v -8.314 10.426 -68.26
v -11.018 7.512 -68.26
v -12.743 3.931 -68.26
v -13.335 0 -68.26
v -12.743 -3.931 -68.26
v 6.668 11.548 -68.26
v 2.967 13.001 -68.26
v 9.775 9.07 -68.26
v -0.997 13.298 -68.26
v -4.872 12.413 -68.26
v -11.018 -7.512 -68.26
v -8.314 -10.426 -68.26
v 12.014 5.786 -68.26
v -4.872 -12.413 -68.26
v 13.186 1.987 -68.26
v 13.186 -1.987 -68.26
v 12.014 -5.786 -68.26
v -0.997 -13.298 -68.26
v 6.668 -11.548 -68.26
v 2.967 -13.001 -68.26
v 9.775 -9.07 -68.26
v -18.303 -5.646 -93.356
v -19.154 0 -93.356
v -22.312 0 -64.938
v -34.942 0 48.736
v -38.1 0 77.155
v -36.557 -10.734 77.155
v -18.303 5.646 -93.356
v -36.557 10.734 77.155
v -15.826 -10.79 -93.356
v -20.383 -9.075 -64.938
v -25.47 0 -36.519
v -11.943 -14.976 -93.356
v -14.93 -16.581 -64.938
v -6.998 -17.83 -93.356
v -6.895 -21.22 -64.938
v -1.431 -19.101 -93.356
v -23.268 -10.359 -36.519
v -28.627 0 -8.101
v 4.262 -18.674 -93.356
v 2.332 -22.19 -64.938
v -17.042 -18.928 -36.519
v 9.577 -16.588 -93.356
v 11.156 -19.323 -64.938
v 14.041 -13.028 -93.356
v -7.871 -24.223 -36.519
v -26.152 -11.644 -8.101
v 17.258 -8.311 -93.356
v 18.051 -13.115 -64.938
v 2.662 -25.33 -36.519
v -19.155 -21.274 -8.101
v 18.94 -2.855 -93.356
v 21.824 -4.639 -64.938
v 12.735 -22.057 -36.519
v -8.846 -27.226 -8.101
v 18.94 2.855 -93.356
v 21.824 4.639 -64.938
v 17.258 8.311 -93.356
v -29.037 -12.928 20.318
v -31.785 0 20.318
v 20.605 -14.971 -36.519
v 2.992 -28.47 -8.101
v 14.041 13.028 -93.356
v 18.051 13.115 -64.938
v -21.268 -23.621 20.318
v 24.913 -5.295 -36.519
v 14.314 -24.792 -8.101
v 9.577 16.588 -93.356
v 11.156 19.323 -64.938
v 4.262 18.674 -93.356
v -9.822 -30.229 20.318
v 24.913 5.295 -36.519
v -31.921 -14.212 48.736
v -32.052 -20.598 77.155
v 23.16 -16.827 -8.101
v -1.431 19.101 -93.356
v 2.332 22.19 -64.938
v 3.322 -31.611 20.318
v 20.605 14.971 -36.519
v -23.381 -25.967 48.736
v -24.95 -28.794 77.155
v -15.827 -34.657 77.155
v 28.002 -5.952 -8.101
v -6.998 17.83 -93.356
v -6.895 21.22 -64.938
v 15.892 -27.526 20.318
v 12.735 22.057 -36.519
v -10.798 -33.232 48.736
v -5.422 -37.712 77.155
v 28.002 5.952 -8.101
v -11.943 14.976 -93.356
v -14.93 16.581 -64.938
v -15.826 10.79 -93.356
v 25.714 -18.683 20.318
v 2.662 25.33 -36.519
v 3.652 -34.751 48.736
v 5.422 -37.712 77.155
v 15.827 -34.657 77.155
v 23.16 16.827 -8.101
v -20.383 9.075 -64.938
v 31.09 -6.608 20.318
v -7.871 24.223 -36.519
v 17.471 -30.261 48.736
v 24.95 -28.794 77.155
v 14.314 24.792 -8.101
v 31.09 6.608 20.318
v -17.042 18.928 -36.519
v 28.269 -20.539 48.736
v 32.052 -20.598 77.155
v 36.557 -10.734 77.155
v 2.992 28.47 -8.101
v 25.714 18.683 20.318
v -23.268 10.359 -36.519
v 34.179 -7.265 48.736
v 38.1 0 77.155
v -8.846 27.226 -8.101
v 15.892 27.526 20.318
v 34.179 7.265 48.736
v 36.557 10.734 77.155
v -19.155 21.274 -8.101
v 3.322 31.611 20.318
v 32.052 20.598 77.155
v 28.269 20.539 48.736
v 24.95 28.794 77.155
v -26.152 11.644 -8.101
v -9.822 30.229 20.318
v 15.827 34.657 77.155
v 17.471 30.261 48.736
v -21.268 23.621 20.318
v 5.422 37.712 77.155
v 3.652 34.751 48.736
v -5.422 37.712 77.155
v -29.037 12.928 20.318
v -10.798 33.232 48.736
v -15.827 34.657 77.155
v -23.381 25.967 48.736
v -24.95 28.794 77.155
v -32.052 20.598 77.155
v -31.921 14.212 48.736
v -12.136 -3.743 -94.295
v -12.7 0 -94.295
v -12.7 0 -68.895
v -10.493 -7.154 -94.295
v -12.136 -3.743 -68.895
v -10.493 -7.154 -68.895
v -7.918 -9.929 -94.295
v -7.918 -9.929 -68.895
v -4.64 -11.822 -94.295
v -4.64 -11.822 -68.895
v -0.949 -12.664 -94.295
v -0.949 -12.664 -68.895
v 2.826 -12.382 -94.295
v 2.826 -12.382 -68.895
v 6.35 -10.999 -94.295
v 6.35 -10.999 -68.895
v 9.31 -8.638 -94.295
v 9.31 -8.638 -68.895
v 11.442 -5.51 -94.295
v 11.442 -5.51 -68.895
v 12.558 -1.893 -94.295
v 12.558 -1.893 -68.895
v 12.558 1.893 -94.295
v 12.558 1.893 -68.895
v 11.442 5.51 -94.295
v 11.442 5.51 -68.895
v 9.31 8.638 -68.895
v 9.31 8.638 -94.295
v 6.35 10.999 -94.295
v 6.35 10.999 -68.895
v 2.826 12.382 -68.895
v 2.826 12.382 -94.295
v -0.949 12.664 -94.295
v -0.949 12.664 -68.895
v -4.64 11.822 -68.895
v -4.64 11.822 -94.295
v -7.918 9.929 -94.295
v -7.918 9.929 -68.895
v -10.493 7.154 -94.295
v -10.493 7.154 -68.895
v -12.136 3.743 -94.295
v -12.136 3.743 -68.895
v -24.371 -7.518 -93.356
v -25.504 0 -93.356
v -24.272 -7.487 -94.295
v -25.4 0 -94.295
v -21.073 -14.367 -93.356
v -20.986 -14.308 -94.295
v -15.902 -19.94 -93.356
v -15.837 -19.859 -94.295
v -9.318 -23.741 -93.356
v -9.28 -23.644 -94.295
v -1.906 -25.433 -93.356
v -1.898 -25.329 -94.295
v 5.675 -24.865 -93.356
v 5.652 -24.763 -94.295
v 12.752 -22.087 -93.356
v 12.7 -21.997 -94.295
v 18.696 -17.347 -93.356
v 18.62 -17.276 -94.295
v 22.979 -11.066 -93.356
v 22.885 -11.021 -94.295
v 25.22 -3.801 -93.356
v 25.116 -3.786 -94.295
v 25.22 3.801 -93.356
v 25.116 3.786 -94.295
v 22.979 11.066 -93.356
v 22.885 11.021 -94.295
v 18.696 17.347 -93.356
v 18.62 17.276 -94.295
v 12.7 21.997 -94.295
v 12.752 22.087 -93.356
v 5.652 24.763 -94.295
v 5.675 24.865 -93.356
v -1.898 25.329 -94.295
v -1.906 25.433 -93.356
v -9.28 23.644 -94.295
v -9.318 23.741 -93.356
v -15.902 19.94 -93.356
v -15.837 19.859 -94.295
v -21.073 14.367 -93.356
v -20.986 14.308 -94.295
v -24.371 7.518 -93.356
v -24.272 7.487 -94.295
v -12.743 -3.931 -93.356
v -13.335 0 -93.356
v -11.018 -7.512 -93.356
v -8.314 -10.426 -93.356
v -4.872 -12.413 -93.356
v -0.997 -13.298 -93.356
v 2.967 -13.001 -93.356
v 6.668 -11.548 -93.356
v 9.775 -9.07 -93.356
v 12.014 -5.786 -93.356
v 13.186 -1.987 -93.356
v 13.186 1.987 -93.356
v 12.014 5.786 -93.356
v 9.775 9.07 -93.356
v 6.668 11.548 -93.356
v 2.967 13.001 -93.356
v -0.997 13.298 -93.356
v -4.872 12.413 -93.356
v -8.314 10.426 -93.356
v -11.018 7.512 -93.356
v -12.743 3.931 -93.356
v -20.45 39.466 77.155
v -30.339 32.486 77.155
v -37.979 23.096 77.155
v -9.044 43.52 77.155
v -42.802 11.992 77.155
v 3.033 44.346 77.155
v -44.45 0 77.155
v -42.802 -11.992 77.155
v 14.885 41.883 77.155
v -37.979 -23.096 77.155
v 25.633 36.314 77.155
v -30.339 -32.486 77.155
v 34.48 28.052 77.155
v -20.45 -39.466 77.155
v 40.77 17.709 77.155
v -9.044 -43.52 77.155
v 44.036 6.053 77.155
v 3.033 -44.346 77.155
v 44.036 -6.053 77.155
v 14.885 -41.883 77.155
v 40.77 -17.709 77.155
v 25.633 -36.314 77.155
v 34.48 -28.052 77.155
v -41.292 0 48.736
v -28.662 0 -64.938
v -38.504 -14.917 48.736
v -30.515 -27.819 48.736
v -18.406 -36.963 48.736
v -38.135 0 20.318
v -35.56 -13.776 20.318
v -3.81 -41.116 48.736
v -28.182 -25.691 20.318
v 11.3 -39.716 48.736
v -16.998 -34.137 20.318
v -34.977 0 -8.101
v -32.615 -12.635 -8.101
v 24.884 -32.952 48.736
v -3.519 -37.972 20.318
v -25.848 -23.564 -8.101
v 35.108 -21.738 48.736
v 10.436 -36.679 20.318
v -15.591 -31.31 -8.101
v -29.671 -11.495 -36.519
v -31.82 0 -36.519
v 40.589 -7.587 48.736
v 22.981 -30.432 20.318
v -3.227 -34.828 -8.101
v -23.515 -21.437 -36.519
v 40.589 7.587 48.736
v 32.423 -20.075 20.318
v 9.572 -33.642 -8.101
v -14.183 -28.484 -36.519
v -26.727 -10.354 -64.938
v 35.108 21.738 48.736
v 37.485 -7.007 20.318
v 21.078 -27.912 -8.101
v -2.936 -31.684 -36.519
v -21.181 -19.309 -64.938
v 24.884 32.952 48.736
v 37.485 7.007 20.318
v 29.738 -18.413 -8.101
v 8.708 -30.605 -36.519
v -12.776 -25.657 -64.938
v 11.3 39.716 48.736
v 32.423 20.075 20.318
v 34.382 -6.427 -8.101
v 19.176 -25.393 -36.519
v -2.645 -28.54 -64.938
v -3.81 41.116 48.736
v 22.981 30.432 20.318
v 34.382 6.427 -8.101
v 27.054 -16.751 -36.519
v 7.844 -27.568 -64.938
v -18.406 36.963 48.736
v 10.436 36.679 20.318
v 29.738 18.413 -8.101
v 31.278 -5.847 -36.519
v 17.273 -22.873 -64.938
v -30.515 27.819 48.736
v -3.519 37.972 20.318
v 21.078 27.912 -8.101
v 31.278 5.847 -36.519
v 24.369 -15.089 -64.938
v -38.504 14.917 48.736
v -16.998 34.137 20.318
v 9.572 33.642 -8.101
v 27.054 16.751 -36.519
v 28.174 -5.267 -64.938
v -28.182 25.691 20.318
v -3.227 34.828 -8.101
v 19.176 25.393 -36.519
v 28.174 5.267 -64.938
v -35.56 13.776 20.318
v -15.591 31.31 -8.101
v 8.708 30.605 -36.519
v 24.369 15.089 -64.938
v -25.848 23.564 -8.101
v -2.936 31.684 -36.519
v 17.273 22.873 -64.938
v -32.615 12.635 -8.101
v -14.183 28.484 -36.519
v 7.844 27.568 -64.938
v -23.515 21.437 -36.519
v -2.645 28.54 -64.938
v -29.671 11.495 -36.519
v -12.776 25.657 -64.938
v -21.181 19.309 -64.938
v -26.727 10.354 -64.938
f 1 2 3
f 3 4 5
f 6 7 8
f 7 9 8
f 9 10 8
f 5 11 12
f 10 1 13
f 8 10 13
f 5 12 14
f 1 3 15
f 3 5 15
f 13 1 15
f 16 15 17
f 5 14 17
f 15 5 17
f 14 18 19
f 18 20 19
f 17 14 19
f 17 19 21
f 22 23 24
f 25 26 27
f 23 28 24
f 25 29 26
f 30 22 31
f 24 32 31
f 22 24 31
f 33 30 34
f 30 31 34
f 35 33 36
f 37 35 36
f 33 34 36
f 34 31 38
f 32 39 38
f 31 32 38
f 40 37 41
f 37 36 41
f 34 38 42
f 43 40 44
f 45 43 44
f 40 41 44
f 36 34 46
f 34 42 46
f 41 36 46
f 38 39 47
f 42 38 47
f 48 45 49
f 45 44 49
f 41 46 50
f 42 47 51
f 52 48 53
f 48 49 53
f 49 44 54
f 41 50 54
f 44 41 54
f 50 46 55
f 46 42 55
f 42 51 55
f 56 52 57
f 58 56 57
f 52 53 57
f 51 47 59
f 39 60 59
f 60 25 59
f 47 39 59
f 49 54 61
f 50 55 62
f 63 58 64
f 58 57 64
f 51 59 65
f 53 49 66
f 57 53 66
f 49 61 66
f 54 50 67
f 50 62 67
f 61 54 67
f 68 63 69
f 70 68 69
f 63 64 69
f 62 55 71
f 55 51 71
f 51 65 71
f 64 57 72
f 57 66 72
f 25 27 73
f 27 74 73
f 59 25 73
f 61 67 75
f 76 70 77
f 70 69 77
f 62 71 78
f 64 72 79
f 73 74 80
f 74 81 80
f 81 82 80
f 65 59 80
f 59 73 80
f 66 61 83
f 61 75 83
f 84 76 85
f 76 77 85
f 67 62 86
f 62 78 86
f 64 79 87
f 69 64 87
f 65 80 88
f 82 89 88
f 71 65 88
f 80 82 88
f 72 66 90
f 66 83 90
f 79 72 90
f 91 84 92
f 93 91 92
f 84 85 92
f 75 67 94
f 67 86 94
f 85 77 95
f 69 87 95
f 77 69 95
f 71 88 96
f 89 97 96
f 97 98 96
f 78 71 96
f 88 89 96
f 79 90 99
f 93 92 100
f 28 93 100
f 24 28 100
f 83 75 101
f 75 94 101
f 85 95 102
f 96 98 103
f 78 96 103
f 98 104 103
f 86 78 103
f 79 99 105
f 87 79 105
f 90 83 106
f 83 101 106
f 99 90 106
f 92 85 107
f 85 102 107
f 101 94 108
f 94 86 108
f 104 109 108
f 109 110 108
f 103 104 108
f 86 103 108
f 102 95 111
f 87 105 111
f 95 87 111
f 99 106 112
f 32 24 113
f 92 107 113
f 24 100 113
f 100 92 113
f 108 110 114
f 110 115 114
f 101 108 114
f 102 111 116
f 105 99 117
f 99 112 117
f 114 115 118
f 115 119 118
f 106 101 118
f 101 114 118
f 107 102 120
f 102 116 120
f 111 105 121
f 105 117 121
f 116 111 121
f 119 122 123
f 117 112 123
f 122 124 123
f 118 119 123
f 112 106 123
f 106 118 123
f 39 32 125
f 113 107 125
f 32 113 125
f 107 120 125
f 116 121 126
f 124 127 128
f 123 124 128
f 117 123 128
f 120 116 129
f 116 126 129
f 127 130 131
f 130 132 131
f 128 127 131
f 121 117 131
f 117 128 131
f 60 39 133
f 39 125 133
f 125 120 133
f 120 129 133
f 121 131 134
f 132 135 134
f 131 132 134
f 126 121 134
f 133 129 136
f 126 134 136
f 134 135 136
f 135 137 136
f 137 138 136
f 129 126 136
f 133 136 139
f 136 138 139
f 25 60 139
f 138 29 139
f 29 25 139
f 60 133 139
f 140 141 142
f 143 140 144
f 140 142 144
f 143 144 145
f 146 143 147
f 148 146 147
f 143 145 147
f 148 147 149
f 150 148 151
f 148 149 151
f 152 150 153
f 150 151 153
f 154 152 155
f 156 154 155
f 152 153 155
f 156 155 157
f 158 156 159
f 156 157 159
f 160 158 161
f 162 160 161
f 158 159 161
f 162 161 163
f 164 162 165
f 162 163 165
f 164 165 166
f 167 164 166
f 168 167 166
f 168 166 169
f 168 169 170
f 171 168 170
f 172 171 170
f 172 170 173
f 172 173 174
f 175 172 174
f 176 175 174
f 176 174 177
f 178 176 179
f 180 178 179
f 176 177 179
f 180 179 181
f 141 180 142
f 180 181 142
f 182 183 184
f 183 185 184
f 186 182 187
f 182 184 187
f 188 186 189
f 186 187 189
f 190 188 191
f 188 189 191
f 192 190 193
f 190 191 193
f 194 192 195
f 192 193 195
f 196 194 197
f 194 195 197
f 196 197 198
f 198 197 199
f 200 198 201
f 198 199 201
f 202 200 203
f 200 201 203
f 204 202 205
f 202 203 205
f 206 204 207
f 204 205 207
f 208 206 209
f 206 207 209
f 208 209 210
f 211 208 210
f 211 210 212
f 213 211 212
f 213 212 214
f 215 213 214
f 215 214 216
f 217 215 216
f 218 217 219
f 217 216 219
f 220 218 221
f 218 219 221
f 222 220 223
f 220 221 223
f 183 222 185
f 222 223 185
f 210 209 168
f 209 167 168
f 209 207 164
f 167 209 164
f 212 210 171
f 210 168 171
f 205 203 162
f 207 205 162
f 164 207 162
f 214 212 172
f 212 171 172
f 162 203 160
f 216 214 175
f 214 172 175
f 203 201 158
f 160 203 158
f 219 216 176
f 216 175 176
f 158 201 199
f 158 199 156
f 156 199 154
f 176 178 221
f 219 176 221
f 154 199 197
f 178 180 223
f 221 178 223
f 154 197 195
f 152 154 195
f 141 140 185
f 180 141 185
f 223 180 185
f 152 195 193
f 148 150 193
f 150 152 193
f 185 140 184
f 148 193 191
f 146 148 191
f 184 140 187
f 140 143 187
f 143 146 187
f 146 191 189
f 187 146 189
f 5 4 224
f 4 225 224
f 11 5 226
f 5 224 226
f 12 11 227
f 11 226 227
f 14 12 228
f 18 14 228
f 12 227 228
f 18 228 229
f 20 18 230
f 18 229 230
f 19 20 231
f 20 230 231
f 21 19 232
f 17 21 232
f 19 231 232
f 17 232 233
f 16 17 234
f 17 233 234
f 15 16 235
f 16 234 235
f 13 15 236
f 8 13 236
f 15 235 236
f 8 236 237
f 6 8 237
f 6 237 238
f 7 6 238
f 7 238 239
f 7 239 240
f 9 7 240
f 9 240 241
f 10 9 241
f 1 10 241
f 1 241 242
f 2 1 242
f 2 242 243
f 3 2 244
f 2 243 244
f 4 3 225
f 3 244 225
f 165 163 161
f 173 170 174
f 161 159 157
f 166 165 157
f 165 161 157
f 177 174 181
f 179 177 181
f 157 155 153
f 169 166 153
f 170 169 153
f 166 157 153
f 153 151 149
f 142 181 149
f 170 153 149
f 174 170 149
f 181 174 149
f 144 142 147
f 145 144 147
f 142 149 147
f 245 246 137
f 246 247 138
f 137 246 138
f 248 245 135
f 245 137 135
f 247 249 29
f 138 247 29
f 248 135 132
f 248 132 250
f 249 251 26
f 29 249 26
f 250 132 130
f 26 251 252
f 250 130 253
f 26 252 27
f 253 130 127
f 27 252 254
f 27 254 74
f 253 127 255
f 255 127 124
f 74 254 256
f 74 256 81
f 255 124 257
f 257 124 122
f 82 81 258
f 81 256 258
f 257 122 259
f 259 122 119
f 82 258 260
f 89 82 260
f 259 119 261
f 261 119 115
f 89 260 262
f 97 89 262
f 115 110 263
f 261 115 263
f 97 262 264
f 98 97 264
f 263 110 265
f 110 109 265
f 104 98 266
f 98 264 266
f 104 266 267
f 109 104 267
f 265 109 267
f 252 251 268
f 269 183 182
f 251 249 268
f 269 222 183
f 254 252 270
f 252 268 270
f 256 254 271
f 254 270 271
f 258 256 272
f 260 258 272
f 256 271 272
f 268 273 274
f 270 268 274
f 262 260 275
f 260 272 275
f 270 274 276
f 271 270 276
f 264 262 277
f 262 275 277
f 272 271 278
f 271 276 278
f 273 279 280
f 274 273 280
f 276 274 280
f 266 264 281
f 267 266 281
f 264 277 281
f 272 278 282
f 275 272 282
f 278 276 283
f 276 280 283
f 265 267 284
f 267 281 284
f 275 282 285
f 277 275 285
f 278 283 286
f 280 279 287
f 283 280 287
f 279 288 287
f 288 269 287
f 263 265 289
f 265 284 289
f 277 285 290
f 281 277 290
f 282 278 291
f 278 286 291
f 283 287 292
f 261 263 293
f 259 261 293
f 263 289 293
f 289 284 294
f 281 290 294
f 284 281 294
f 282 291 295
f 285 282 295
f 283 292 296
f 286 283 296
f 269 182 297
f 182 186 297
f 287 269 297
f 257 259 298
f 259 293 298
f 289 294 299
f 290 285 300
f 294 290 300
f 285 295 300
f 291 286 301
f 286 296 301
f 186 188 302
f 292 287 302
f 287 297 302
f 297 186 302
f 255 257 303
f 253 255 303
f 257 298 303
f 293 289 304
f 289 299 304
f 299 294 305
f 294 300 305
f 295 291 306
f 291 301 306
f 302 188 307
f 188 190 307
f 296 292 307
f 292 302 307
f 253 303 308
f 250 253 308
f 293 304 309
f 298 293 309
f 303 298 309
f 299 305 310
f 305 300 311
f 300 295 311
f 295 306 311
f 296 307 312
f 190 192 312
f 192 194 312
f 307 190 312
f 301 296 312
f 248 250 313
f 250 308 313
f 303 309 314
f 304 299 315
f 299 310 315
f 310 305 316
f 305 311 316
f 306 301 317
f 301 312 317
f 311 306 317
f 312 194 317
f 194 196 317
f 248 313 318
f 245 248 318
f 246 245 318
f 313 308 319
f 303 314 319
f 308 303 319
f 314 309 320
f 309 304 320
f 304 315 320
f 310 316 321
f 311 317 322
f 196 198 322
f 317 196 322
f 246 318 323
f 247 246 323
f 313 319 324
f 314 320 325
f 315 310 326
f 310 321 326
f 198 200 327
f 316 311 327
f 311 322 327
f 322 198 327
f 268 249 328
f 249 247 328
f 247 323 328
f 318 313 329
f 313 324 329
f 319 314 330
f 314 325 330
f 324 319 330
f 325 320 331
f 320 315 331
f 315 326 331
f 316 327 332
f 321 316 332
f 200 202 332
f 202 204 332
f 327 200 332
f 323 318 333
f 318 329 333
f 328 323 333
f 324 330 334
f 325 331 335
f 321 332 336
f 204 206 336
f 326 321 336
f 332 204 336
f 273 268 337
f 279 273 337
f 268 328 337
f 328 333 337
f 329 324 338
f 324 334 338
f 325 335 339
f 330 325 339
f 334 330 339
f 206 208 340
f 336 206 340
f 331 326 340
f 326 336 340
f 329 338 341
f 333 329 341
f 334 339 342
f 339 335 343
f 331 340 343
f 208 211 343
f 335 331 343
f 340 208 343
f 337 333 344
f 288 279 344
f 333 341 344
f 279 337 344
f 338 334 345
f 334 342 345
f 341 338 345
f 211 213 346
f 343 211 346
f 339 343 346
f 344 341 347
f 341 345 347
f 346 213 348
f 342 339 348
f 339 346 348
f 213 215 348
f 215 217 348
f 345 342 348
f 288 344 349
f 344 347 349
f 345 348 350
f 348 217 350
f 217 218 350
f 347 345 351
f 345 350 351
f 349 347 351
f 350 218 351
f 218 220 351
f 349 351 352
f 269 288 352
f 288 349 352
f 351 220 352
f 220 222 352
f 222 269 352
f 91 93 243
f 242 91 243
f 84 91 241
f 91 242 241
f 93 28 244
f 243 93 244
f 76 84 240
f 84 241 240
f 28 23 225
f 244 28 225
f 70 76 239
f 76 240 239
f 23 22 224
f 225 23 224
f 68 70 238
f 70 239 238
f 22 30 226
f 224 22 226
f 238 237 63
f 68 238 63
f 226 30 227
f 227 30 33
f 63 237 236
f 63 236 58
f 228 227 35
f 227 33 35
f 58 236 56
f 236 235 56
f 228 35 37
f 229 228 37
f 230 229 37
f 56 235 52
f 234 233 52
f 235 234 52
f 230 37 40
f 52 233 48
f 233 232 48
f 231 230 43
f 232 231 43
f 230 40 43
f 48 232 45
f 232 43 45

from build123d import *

# Parameters (mm, degrees)
F0_W = 0.635
F0_H = 0.9395605023


with BuildPart() as f1:
    # F0 (on Front) → F1 (revolve)
    with BuildSketch(Plane.XZ):
        Polygon((-19.05, -94.2954702053), (-19.1543956114, -93.355909703), (-25.5043956114, -93.355909703), (-25.4, -94.2954702053), align=None)
        with Locations((-13.0175, -93.8256899541)):
            Rectangle(F0_W, F0_H)
        Polygon((0, -68.8954702053), (0, -68.2604702053), (-13.335, -68.2604702053), (-13.335, -93.355909703), (-12.7, -93.355909703), (-12.7, -68.8954702053), align=None)
        Polygon((-13.335, -93.355909703), (-19.1543956114, -93.355909703), (-19.05, -94.2954702053), (-13.335, -94.2954702053), align=None)
        Polygon((-19.1543956114, -93.355909703), (-38.1, 77.1545297947), (-44.45, 77.1545297947), (-25.5043956114, -93.355909703), align=None)
    revolve(axis=Axis((0, 0, 4.1295297947), (0, 0, 1)))


solid = f1.part
